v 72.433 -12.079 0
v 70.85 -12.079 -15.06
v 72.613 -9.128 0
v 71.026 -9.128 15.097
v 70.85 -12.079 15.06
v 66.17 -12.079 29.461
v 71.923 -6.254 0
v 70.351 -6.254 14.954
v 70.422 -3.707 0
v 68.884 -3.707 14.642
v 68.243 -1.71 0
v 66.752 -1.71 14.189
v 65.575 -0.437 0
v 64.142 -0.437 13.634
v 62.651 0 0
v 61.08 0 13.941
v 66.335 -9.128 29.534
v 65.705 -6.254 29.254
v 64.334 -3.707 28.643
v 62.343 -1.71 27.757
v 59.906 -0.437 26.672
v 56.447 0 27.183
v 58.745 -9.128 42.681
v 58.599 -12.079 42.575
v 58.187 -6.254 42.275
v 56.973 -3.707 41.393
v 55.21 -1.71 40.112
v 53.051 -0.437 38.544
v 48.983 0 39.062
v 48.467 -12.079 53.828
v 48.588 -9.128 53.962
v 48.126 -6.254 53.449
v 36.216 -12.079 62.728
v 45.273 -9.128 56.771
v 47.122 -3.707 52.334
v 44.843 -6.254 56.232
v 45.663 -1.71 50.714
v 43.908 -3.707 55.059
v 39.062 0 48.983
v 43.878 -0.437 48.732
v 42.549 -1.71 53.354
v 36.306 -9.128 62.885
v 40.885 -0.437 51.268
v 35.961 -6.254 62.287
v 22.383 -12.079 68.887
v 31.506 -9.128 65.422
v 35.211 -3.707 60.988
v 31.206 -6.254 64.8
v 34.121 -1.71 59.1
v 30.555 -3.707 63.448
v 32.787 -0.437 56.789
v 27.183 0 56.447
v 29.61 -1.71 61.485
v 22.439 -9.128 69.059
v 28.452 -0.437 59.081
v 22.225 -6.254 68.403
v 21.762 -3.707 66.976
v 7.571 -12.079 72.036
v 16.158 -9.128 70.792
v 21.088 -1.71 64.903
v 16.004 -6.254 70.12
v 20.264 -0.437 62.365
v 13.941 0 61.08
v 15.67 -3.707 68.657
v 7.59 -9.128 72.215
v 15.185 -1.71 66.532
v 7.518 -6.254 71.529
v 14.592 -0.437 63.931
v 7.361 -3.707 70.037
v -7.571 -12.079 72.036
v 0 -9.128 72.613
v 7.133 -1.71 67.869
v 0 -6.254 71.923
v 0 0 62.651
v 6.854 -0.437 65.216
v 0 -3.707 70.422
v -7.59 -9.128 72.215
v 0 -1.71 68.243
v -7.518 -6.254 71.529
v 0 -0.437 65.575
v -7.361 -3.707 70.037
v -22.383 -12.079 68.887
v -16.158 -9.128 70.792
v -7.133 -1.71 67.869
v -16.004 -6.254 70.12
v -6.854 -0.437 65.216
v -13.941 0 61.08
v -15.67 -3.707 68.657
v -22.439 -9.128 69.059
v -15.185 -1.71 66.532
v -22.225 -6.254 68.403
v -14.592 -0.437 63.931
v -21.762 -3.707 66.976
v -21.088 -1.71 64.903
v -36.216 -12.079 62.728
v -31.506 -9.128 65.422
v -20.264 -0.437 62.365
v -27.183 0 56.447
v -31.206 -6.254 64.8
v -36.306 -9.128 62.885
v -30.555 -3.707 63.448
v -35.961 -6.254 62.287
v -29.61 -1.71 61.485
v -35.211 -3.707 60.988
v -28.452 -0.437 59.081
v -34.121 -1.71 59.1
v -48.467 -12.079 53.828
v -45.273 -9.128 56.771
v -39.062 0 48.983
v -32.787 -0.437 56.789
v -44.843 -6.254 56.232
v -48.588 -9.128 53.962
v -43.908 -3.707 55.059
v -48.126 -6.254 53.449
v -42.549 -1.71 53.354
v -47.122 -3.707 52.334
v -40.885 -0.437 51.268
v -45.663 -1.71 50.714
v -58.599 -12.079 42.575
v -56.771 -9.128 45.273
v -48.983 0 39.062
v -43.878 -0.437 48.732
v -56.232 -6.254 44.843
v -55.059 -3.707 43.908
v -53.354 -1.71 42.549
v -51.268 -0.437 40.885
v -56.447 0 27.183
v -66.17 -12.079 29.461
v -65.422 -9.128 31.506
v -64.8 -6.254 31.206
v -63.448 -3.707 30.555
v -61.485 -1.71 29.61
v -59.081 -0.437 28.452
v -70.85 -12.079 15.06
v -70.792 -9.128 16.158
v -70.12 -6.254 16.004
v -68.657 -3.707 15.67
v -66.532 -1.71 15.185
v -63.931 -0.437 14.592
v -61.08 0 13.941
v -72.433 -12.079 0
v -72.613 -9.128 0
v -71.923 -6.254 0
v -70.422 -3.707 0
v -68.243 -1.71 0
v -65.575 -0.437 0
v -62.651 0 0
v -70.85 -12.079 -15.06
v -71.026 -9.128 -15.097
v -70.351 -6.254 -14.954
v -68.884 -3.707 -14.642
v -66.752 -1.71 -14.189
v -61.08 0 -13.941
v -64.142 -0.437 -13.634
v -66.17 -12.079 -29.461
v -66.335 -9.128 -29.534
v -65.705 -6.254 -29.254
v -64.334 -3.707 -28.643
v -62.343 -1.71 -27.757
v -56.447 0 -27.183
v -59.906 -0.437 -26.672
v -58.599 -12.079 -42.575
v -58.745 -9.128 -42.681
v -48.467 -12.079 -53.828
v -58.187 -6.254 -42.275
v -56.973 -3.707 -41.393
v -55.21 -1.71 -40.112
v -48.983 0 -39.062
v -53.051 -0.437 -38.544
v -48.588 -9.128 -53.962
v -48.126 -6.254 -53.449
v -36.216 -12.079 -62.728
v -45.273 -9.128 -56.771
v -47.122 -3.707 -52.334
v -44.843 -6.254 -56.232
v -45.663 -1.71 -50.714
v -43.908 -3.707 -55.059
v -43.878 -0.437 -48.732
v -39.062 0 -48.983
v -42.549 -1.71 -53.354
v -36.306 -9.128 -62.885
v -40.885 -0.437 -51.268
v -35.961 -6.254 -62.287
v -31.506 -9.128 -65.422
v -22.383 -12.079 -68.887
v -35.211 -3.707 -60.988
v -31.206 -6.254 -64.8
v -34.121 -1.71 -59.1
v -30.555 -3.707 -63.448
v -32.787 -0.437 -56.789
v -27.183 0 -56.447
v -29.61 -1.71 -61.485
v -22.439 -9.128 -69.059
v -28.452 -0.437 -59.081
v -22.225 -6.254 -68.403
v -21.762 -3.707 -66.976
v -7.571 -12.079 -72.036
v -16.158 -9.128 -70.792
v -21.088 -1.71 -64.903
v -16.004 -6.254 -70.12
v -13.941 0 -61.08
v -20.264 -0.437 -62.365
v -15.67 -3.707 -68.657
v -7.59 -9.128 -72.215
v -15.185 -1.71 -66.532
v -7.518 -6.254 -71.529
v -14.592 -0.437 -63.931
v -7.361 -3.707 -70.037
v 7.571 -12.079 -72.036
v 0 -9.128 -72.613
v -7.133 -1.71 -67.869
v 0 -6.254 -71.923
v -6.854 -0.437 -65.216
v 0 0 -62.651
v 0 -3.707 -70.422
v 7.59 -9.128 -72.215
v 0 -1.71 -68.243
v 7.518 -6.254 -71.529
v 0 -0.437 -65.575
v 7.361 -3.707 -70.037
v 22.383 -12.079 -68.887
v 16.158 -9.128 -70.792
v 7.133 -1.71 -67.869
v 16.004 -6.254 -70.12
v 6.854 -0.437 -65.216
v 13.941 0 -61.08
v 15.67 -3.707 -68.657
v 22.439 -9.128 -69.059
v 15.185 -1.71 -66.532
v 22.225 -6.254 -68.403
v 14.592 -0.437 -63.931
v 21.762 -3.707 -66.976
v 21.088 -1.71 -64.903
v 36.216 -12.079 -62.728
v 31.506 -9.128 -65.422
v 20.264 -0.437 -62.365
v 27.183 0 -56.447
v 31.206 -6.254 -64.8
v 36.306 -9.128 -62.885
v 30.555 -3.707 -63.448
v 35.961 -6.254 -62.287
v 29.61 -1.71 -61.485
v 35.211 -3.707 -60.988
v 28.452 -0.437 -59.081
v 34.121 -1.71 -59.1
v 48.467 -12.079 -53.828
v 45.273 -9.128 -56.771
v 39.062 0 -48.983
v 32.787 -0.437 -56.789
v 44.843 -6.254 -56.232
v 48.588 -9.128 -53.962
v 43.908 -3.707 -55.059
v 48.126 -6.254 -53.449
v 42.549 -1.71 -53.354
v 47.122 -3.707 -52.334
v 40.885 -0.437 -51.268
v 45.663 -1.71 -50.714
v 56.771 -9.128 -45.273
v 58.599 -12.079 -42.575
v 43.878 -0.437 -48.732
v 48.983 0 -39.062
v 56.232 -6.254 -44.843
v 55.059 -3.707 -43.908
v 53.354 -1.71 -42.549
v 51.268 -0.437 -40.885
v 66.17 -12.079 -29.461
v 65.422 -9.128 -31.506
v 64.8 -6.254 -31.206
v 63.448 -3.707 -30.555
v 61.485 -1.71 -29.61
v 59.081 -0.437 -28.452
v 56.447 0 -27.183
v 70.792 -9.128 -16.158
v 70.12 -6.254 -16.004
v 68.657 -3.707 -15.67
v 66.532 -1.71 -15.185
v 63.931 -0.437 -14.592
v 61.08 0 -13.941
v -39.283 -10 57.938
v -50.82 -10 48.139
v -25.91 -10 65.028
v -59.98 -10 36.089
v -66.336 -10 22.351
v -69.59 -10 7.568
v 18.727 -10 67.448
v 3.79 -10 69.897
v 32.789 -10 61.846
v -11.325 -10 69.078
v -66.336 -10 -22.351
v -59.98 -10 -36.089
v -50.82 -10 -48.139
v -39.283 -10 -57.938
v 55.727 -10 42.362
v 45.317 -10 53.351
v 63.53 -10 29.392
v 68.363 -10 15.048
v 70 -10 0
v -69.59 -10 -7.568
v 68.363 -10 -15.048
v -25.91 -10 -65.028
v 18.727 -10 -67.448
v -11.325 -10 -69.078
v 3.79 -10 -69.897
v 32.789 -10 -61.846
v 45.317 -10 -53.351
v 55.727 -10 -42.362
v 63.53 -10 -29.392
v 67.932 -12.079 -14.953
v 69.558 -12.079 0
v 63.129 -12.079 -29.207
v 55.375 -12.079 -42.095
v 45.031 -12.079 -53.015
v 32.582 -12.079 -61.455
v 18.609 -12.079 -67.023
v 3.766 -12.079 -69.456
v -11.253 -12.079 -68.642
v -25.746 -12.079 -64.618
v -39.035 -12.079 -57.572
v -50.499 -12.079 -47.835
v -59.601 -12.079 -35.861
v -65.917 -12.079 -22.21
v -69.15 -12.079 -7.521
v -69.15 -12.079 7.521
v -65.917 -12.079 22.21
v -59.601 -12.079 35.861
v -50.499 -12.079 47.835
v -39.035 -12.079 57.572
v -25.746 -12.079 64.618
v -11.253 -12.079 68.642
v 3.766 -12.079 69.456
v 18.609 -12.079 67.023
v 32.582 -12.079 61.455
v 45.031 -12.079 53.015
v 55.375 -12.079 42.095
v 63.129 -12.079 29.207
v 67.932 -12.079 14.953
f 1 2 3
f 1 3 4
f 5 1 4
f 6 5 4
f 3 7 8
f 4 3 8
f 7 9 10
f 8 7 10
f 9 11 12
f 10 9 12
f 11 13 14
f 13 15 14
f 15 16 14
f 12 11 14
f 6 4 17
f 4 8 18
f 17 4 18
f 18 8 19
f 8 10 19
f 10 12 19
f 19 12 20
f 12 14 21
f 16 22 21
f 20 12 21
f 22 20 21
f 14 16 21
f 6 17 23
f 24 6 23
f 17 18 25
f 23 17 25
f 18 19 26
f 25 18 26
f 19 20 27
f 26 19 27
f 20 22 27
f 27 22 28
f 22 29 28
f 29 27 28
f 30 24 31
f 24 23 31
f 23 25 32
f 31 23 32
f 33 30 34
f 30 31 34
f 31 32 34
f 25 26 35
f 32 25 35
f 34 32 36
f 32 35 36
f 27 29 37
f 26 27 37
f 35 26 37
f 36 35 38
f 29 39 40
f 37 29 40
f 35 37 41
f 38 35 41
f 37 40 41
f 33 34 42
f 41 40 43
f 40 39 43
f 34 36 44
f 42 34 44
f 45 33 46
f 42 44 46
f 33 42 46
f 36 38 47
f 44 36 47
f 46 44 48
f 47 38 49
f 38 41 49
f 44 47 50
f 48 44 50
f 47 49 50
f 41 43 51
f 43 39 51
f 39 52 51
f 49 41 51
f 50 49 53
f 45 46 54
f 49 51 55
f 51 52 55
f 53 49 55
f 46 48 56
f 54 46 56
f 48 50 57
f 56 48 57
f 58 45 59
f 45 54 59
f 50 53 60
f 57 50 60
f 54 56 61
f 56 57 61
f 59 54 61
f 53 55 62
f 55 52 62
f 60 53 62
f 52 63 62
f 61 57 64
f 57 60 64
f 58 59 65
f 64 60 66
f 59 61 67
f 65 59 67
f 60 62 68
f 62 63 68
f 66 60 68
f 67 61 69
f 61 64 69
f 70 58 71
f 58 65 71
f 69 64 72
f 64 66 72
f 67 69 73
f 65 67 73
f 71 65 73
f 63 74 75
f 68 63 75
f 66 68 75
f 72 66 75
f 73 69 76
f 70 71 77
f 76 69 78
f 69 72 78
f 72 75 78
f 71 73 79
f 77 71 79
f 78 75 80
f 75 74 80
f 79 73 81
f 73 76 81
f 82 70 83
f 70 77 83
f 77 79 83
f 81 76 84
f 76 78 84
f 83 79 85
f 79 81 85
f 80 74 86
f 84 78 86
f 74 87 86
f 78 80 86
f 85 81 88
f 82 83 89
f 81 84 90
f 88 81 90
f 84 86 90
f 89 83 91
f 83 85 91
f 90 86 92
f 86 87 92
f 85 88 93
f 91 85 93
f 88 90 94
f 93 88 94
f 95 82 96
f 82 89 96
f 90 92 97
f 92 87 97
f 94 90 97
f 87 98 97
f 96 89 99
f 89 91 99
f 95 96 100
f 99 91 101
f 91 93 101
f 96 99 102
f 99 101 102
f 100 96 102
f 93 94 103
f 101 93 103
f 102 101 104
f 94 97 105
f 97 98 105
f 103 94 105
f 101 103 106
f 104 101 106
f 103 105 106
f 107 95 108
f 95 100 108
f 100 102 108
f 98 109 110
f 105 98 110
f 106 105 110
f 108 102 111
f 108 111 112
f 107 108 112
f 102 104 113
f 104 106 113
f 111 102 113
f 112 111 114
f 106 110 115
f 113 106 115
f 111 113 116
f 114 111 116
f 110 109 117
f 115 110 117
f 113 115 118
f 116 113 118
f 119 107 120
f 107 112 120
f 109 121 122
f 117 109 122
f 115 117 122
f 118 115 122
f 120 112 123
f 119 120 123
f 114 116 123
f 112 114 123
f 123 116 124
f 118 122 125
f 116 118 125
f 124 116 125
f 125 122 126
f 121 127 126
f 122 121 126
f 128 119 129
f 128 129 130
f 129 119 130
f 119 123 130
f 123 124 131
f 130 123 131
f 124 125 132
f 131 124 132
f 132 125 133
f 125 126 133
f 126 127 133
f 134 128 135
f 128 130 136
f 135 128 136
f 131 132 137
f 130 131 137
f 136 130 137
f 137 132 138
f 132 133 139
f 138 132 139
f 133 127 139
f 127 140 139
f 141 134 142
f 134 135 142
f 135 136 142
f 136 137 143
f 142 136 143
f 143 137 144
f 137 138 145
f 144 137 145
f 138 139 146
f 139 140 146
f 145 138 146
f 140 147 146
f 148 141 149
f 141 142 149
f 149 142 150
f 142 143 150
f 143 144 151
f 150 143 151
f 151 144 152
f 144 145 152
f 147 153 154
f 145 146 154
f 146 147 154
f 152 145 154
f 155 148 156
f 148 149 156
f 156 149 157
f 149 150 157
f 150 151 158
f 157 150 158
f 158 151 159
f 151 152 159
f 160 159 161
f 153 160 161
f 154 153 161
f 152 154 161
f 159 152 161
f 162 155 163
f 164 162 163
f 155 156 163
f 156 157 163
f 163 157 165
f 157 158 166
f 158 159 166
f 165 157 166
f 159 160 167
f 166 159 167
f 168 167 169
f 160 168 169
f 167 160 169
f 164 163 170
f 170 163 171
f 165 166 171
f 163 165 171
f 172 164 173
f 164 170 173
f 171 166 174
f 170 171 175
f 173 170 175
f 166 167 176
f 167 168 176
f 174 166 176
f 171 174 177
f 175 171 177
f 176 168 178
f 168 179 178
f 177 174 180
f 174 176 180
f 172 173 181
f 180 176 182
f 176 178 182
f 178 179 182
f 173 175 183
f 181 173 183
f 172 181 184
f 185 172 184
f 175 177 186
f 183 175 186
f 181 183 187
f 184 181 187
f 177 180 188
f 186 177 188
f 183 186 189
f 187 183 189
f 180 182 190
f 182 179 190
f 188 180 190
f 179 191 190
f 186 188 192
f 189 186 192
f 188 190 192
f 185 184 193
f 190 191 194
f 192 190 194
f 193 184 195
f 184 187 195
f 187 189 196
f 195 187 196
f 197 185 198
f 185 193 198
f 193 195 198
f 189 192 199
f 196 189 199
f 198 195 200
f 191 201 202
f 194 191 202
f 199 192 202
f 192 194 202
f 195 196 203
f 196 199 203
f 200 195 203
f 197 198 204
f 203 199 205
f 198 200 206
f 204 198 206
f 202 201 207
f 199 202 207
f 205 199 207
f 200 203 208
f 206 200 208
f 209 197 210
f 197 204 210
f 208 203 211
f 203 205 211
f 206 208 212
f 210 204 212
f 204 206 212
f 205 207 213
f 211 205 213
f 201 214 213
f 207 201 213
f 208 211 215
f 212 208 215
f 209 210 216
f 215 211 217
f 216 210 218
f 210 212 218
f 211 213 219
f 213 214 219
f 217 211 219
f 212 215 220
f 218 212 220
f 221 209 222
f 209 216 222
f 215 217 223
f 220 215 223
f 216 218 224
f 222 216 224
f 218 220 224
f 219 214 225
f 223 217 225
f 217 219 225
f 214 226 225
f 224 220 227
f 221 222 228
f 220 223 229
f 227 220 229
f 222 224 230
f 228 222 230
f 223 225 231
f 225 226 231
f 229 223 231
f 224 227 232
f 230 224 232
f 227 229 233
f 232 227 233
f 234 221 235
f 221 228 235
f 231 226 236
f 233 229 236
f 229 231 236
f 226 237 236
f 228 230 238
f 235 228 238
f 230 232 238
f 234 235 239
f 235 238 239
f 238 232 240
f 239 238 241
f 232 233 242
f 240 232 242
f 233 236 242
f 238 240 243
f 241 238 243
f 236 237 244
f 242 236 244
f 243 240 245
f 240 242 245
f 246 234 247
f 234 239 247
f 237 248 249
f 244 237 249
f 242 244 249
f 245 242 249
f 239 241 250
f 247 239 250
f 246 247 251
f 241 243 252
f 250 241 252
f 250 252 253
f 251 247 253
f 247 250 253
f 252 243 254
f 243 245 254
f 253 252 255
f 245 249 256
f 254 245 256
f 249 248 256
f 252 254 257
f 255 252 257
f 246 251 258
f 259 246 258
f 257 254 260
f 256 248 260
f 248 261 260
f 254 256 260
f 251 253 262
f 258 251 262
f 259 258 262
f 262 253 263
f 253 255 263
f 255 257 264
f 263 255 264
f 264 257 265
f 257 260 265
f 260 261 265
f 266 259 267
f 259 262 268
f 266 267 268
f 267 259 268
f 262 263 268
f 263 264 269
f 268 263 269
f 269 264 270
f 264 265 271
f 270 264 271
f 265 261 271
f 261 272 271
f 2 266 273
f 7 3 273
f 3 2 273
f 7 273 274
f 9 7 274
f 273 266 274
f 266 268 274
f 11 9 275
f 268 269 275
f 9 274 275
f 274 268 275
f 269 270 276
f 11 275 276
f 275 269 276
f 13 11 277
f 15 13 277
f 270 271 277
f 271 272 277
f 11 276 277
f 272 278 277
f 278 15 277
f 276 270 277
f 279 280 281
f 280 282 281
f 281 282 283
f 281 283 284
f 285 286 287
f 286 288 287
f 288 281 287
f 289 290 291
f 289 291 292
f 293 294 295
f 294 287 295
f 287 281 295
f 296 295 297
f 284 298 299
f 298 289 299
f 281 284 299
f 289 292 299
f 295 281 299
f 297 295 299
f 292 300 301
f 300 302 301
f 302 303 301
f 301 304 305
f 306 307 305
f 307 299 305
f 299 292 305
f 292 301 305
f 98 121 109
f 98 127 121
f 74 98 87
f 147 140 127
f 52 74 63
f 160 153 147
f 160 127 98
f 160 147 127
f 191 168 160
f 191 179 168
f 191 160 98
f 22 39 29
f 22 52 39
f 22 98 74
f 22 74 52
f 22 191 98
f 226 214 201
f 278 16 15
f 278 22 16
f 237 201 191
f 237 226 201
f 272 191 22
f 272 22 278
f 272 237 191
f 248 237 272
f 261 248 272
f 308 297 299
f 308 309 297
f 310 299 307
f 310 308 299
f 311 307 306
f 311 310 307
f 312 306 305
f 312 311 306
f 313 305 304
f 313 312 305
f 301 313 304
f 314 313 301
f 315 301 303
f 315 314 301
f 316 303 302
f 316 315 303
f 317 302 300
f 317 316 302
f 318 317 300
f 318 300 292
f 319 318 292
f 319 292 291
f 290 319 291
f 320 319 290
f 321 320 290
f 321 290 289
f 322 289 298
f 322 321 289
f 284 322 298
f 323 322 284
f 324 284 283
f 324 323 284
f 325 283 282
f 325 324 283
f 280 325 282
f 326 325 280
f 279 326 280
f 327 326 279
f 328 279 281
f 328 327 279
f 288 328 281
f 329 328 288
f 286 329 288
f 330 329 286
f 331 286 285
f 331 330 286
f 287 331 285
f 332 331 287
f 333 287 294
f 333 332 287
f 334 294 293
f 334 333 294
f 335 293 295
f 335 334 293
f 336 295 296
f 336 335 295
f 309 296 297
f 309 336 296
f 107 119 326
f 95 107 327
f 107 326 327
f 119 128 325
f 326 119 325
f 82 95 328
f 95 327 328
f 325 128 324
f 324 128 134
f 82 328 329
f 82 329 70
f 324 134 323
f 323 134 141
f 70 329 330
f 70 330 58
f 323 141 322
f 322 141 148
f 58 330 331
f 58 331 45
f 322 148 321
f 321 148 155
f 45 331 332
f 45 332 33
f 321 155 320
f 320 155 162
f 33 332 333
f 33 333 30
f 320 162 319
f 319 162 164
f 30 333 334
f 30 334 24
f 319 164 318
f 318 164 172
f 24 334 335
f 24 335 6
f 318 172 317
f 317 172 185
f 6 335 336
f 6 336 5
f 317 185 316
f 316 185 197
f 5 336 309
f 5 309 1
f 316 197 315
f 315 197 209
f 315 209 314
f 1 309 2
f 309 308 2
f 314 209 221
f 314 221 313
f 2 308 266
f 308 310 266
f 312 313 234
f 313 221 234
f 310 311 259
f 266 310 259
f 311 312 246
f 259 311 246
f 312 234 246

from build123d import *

# Parameters (mm, degrees)
SKETCH1_R           = 75
BOSS_EXTRUDE1_DEPTH = 100
BOSS_EXTRUDE1_TAPER = 12
SKETCH3_R           = 70
CUT_EXTRUDE1_DEPTH  = 80
CUT_EXTRUDE1_TAPER  = 12
FILLET1_R           = 10
SKETCH4_R           = 15
CUT_EXTRUDE2_DEPTH  = 90
SKETCH5_R           = 14.5
SKETCH5_R_2         = 12.5
BOSS_EXTRUDE2_DEPTH = 30
SKETCH6_R           = 12.5
CUT_EXTRUDE3_DEPTH  = 30
SKETCH7_R           = 73.5
CUT_EXTRUDE4_DEPTH  = 130


with BuildPart() as part:
    # Sketch1 → Boss-Extrude1 (new body)
    with BuildSketch(Plane(origin=(0, 0, 0), x_dir=(1, 0, 0), z_dir=(0, 1, 0))):
        Circle(SKETCH1_R)
    extrude(amount=-BOSS_EXTRUDE1_DEPTH, taper=BOSS_EXTRUDE1_TAPER)

    # Sketch3 → Cut-Extrude1 (cut)
    with BuildSketch(Plane(origin=(0, -10, 0), x_dir=(1, 0, 0), z_dir=(0, 1, 0))):
        Circle(SKETCH3_R)
    extrude(amount=-CUT_EXTRUDE1_DEPTH, taper=CUT_EXTRUDE1_TAPER, mode=Mode.SUBTRACT)

    # Fillet1
    fillet1_edges = [part.edges().sort_by_distance(p)[0] for p in [
        (-75, 0, 0),
    ]]
    fillet(fillet1_edges, radius=FILLET1_R)

    # Sketch4 → Cut-Extrude2 (cut)
    with BuildSketch(Plane.XY):
        with Locations((-25, -40)):
            Circle(SKETCH4_R)
        with Locations((25, -40)):
            Circle(SKETCH4_R)
        with BuildLine():
            Line((-15, -70), (15, -70))
            ThreePointArc((15, -70), (0, -85), (-15, -70))
        make_face()
    extrude(amount=-CUT_EXTRUDE2_DEPTH, mode=Mode.SUBTRACT)

    # Sketch5 → Boss-Extrude2 (add)
    with BuildSketch(Plane.XZ.offset(100)):
        Circle(SKETCH5_R)
        Circle(SKETCH5_R_2, mode=Mode.SUBTRACT)
    extrude(amount=BOSS_EXTRUDE2_DEPTH)

    # Sketch6 → Cut-Extrude3 (cut)
    with BuildSketch(Plane.XZ.offset(100)):
        Circle(SKETCH6_R)
    extrude(amount=-CUT_EXTRUDE3_DEPTH, mode=Mode.SUBTRACT)

    # Sketch7 → Cut-Extrude4 (cut)
    with BuildSketch(Plane(origin=(0, -12.079116908, 0), x_dir=(1, 0, 0), z_dir=(0, 1, 0))):
        Circle(SKETCH7_R)
    extrude(amount=-CUT_EXTRUDE4_DEPTH, mode=Mode.SUBTRACT)


solid = part.part
